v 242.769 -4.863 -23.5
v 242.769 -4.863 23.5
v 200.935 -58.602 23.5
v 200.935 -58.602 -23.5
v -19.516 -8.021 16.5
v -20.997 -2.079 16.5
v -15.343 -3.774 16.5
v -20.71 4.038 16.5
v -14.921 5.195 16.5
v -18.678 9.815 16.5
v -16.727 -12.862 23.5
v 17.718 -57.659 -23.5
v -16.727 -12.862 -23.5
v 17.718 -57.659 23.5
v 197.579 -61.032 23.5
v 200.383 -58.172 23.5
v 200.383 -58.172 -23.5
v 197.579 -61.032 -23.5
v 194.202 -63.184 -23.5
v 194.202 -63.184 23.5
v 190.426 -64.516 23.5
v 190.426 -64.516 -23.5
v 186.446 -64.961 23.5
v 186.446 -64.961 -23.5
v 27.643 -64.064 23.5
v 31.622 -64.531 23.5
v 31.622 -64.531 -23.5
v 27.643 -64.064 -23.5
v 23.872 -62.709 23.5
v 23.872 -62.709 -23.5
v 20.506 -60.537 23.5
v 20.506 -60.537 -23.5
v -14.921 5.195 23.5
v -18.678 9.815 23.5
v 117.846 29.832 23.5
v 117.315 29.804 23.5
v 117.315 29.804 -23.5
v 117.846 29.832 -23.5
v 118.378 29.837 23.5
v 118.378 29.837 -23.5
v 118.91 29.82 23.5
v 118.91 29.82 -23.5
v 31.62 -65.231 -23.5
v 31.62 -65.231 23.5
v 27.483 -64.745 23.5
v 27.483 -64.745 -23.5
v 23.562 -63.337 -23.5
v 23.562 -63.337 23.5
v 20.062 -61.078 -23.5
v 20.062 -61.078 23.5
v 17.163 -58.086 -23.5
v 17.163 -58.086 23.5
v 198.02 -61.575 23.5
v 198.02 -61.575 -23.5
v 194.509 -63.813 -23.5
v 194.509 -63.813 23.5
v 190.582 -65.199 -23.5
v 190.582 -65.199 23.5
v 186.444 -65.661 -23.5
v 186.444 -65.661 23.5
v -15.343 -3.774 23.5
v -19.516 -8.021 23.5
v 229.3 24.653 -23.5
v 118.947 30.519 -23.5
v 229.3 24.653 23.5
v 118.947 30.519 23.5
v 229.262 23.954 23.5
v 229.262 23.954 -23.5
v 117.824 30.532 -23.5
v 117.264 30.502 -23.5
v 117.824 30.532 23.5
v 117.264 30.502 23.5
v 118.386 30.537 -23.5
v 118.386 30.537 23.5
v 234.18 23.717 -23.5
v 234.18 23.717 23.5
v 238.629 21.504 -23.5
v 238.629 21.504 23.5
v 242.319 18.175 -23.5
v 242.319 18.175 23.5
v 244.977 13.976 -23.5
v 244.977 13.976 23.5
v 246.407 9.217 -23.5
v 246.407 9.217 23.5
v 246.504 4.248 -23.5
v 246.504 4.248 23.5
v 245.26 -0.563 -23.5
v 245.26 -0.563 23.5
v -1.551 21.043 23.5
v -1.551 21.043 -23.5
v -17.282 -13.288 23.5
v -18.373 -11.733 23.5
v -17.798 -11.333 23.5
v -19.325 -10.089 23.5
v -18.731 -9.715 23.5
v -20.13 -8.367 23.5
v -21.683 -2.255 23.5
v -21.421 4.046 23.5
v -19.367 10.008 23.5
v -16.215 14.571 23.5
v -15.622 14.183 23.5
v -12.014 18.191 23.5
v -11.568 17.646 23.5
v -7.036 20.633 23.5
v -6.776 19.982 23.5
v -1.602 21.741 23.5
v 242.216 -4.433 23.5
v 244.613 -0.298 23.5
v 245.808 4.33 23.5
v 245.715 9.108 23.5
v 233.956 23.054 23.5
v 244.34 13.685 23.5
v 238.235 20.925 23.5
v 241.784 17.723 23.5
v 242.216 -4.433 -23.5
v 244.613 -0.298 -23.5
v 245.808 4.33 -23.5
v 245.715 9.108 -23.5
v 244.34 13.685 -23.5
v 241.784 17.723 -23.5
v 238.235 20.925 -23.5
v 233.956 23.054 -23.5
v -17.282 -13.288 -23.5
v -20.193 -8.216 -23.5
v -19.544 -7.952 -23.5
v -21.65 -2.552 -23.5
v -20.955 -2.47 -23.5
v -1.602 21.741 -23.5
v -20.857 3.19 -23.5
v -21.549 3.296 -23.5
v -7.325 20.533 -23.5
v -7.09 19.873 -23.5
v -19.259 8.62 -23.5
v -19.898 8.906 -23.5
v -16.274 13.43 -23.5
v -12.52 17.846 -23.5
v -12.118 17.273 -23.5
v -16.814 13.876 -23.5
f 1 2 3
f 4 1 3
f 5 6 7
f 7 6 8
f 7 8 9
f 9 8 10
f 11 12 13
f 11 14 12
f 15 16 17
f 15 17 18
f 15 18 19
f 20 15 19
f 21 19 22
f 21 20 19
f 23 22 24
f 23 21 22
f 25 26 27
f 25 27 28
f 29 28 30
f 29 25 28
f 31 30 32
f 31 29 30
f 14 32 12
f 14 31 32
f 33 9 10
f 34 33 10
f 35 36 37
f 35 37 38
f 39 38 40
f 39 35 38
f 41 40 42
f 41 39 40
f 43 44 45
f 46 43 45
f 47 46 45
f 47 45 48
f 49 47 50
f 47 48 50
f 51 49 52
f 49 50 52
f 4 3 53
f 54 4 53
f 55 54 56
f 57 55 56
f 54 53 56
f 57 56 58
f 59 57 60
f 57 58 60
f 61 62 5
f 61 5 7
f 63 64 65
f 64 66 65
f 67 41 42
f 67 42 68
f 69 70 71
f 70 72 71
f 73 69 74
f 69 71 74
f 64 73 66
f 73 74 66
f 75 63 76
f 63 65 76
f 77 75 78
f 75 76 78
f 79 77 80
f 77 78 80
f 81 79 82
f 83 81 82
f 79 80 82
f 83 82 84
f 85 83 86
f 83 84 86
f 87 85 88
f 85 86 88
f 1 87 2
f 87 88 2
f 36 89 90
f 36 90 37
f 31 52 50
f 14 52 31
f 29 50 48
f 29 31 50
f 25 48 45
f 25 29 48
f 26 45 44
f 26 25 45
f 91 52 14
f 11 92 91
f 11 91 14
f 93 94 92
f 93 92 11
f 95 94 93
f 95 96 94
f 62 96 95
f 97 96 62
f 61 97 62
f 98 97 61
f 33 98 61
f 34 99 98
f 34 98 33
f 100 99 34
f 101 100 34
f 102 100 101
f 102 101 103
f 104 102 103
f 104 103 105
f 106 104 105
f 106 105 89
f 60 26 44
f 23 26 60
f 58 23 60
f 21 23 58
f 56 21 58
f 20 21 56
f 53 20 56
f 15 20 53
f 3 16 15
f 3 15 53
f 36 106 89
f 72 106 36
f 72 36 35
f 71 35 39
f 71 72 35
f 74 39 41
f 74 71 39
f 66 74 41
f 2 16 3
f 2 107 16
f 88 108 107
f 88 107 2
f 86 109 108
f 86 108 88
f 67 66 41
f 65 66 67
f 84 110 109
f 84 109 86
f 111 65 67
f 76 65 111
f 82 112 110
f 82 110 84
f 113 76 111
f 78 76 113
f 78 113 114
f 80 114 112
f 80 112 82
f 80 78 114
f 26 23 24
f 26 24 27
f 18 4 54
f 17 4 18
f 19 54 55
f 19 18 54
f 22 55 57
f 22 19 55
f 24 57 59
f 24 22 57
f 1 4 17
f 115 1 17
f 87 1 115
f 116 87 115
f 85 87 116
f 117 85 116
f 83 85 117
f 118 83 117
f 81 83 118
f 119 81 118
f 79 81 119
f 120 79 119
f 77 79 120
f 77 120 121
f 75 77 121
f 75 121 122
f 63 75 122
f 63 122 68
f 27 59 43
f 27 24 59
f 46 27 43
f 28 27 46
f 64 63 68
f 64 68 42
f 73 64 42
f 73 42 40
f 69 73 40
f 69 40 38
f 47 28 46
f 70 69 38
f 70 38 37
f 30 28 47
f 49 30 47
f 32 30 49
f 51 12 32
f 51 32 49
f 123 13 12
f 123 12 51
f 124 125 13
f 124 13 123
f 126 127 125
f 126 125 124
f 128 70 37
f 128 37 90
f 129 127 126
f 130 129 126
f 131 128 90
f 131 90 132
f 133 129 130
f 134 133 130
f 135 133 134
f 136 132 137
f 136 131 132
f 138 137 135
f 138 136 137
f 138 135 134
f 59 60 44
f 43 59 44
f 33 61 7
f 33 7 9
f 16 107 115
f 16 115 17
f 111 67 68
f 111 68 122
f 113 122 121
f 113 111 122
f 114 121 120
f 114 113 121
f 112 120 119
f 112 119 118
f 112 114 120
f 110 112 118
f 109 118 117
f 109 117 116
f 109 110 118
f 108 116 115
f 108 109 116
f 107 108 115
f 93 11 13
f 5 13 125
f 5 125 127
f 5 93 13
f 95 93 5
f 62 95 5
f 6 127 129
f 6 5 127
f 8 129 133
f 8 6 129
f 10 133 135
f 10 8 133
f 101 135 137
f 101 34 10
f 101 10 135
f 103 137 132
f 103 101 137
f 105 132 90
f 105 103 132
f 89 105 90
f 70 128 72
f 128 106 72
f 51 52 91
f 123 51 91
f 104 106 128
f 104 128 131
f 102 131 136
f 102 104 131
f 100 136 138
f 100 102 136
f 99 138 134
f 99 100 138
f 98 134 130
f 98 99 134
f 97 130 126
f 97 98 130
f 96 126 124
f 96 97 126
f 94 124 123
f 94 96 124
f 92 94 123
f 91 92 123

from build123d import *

# Parameters (mm, degrees)
EXTRUDE_THIN1_DEPTH = 23.5
BOSS_EXTRUDE1_DEPTH = 7


with BuildPart() as part:
    # Sketch2 → Extrude-Thin1 (new, symmetric)
    with BuildSketch(Plane.XY):
        with BuildLine():
            Line((17.163468236, -58.085931667), (-17.281893756, -13.288195823))
            ThreePointArc((-17.281893756, -13.288195823), (-19.897637951, 8.906402414), (-1.60242719, 21.741026358))
            Line((-1.60242719, 21.741026358), (117.263507159, 30.502066523))
            ThreePointArc((117.263507159, 30.502066523), (118.105083127, 30.537349971), (118.94720479, 30.519290718))
            Line((118.94720479, 30.519290718), (229.299625502, 24.652631518))
            ThreePointArc((229.299625502, 24.652631518), (244.976573908, 13.975728829), (242.768549107, -4.862731534))
            Line((242.768549107, -4.862731534), (200.935093877, -58.602091631))
            ThreePointArc((200.935093877, -58.602091631), (194.508519277, -63.812915391), (186.443863356, -65.660852138))
            Line((186.443863356, -65.660852138), (31.619949002, -65.231091278))
            ThreePointArc((31.619949002, -65.231091278), (23.562249738, -63.336718399), (17.163468236, -58.085931667))
        make_face()
        with BuildLine():
            Line((17.71839143, -57.65924648), (-16.726970562, -12.861510636))
            ThreePointArc((-16.726970562, -12.861510636), (-19.258722971, 8.620417015), (-1.550973106, 21.042920007))
            Line((-1.550973106, 21.042920007), (117.314961243, 29.803960172))
            ThreePointArc((117.314961243, 29.803960172), (118.112243739, 29.837386596), (118.910043209, 29.820277831))
            Line((118.910043209, 29.820277831), (229.262463921, 23.95361863))
            ThreePointArc((229.262463921, 23.95361863), (244.339747634, 13.685122055), (242.216182798, -4.432741463))
            Line((242.216182798, -4.432741463), (200.382727568, -58.17210156))
            ThreePointArc((200.382727568, -58.17210156), (194.201978227, -63.183604192), (186.445806412, -64.960854834))
            Line((186.445806412, -64.960854834), (31.621892057, -64.531093975))
            ThreePointArc((31.621892057, -64.531093975), (23.872410798, -62.709183447), (17.71839143, -57.65924648))
        make_face(mode=Mode.SUBTRACT)
    extrude(amount=EXTRUDE_THIN1_DEPTH, both=True)

    # Sketch3 → Boss-Extrude1 (add)
    with BuildSketch(Plane.XY.offset(23.5)):
        with BuildLine():
            Line((-15.342607214, -3.774175921), (-14.921356346, 5.195490812))
            Line((-14.921356346, 5.195490812), (-18.814600986, 9.982348011))
            Line((-18.814600986, 9.982348011), (-19.366834284, 10.008283061))
            ThreePointArc((-19.366834284, 10.008283061), (-21.78121341, 0.904843849), (-20.130207607, -8.367481205))
            Line((-20.130207607, -8.367481205), (-19.667345501, -8.175084284))
            Line((-19.667345501, -8.175084284), (-15.342607214, -3.774175921))
        make_face()
    extrude(amount=-BOSS_EXTRUDE1_DEPTH)


solid = part.part
